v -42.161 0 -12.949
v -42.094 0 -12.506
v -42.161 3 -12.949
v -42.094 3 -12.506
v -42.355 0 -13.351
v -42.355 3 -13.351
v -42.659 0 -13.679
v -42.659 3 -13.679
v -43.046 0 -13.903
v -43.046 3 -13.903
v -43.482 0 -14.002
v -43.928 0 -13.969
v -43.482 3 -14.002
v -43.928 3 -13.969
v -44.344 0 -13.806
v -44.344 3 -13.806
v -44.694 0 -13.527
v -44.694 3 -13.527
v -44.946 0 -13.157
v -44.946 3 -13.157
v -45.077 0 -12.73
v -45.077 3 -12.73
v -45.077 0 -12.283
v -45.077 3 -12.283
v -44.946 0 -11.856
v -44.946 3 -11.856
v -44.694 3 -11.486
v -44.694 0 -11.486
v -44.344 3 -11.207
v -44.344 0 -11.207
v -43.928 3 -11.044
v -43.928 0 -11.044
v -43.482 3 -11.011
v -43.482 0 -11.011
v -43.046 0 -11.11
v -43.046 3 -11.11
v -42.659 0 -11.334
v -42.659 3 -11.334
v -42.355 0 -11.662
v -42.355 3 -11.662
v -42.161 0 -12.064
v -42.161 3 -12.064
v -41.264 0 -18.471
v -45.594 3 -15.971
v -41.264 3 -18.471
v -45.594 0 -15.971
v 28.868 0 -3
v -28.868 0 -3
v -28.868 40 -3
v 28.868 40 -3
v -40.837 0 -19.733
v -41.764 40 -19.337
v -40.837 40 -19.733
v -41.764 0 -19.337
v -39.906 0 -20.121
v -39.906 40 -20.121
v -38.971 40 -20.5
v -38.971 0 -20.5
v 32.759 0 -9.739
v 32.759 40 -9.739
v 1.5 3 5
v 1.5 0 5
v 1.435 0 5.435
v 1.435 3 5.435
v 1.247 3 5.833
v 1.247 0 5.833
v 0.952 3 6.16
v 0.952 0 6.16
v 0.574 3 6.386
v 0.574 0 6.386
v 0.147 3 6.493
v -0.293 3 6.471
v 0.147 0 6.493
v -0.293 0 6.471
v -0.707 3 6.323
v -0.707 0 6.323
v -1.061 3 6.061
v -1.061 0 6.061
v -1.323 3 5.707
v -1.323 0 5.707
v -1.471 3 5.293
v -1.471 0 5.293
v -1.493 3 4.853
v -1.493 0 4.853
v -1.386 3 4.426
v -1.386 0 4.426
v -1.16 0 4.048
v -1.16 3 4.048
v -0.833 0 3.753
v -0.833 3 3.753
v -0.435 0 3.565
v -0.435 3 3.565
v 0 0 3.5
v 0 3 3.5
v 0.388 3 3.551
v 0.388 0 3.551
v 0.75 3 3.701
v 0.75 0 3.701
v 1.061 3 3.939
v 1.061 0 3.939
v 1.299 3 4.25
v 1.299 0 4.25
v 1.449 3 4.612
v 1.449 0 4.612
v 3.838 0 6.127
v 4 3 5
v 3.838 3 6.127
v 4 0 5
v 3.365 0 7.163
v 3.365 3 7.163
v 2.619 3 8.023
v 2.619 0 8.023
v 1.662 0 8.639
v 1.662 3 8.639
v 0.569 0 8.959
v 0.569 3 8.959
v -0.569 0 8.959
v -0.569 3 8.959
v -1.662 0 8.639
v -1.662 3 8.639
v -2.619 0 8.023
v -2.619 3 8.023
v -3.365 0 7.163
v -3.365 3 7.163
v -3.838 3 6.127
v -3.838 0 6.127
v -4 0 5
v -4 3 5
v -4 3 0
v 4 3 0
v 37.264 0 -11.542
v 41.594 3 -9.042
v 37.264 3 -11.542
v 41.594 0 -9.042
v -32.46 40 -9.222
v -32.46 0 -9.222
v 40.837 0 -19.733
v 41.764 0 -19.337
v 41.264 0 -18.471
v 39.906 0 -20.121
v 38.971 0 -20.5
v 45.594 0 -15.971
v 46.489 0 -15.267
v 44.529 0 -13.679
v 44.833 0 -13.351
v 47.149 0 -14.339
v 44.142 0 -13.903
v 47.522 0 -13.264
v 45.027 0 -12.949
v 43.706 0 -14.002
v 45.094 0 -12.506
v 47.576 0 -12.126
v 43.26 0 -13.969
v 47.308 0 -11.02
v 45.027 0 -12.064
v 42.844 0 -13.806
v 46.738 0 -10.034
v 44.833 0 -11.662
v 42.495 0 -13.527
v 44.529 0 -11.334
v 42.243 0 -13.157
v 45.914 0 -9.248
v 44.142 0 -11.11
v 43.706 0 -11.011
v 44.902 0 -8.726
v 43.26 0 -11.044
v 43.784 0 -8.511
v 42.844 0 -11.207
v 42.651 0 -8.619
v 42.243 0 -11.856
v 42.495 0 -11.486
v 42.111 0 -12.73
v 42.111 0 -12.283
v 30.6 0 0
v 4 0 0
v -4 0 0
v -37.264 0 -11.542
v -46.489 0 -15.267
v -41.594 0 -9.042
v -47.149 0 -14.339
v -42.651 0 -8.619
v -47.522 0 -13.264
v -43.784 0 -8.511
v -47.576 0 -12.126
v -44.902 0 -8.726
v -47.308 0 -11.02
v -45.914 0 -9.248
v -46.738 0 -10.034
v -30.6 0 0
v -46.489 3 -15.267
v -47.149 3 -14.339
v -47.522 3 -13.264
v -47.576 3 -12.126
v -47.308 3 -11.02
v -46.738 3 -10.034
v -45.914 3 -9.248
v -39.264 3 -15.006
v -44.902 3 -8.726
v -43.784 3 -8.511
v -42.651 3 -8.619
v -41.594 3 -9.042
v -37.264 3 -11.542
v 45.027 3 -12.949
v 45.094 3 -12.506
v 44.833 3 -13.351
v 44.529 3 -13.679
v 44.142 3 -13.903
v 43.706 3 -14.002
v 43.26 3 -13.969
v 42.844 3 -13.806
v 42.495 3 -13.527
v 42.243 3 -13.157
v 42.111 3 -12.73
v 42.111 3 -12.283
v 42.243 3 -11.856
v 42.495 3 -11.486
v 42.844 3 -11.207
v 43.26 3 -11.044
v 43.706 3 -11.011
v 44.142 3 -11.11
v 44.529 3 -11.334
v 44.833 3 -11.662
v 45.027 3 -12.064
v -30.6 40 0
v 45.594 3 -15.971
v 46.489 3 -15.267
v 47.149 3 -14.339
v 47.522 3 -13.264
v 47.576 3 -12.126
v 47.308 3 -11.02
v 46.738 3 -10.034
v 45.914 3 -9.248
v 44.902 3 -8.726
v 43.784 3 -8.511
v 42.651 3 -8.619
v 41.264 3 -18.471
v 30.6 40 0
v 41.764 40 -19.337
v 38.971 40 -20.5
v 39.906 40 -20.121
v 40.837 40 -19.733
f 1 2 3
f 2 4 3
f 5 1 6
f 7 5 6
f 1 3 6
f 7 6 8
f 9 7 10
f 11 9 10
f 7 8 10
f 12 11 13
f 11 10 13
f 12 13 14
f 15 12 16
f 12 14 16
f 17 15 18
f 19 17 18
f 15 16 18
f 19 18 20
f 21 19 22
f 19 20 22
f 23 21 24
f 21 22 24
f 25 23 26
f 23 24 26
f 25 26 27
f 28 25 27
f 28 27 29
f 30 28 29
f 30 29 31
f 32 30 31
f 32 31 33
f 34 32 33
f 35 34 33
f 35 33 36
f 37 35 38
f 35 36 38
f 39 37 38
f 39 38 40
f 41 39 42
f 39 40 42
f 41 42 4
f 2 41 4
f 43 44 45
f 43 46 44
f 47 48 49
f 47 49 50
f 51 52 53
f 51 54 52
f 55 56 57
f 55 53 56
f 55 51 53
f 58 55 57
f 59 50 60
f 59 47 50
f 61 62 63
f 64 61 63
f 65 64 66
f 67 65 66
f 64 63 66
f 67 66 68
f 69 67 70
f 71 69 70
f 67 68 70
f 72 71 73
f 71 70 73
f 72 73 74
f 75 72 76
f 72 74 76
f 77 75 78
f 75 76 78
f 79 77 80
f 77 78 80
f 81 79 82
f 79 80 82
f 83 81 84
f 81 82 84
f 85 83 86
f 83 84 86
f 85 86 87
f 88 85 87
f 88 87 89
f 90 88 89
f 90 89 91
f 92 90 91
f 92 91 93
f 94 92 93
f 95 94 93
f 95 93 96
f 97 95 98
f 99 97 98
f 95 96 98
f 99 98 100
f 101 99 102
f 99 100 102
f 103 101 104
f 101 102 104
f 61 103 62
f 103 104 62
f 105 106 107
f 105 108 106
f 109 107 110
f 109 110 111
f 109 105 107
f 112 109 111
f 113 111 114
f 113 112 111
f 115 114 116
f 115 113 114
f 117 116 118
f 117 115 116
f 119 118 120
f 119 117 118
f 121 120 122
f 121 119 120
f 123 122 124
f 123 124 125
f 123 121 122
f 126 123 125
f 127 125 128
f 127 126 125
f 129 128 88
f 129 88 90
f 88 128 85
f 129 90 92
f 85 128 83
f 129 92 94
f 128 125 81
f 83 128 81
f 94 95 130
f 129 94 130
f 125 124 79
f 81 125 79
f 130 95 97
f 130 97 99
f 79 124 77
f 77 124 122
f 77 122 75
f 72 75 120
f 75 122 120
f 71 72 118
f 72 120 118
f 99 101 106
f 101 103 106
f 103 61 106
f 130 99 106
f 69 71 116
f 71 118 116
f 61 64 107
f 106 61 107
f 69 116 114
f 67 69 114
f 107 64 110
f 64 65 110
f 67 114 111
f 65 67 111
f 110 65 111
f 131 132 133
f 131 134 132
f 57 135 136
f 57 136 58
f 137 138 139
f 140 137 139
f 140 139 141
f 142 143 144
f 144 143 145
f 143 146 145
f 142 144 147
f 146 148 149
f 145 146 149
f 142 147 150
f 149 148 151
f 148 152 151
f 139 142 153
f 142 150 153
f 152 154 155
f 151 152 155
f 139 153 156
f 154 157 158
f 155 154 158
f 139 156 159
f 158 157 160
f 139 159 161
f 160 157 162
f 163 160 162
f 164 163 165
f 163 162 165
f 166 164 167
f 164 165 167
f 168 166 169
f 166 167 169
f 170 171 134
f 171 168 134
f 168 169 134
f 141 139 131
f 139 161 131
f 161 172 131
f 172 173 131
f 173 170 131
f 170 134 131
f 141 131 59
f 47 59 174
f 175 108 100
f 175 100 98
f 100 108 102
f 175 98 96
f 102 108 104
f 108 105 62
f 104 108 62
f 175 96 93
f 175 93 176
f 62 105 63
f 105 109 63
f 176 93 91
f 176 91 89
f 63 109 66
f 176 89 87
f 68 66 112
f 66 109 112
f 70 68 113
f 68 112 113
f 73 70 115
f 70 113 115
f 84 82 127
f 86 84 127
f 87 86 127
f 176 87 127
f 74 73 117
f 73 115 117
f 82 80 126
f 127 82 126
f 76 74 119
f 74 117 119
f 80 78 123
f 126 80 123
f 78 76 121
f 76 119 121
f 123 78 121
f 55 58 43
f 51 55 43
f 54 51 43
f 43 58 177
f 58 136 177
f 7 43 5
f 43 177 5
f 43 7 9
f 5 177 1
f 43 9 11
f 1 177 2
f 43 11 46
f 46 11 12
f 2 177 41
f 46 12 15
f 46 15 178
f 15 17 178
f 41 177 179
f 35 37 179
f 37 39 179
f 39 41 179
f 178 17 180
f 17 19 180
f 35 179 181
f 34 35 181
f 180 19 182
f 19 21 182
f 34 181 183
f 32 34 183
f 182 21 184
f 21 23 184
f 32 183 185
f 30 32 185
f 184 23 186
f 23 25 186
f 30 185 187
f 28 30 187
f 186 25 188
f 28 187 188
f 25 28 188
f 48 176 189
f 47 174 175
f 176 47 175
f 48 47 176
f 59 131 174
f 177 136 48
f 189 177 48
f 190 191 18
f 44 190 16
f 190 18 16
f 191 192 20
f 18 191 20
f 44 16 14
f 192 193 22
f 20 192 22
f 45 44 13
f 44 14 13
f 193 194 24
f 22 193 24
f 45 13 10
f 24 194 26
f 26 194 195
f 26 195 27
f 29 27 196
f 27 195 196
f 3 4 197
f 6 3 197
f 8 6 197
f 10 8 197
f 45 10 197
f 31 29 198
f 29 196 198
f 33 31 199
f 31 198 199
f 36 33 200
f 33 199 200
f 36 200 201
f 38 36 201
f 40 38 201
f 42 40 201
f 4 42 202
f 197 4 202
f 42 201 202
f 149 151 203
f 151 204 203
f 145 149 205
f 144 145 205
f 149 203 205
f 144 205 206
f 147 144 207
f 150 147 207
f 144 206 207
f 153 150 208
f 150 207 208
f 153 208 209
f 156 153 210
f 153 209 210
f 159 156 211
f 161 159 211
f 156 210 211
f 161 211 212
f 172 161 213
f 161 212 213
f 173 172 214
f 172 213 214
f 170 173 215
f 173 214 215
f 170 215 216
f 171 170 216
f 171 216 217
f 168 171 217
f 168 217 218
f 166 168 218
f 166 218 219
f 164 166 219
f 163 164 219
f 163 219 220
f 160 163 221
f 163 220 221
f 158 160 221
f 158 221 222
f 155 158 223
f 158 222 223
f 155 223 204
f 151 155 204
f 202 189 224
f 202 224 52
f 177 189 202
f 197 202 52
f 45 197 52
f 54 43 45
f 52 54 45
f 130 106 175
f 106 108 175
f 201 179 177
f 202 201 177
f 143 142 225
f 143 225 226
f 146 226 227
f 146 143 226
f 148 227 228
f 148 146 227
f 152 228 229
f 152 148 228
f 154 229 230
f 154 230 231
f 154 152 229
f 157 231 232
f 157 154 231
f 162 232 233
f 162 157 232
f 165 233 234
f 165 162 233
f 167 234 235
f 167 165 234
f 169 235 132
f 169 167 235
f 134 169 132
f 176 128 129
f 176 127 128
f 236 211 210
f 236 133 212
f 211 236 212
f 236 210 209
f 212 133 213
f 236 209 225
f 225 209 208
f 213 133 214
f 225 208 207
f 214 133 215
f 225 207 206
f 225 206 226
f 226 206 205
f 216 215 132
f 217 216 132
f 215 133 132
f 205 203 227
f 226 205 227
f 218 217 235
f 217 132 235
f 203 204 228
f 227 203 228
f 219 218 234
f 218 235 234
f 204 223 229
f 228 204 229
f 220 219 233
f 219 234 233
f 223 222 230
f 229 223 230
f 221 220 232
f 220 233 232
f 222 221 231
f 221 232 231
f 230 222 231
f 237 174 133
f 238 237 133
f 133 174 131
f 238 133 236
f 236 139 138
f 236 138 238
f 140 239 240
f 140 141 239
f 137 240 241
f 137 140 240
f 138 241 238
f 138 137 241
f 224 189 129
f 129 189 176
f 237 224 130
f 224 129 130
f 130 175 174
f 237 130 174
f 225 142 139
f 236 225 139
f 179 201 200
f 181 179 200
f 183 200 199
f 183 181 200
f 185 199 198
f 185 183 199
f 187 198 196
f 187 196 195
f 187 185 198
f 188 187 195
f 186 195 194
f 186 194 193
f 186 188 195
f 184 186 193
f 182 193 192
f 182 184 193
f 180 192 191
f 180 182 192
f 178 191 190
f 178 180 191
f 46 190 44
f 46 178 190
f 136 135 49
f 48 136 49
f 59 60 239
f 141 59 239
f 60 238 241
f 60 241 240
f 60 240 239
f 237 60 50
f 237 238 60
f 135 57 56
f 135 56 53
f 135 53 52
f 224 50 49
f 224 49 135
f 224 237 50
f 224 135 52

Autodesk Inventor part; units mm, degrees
ref_plane "YZ Plane" through (0, 0, 0) normal (1, 0, 0) x (0, 1, 0)
ref_plane "XZ Plane" through (0, 0, 0) normal (0, 1, 0) x (-1, 0, 0)
ref_plane "XY Plane" through (0, 0, 0) normal (0, 0, 1) x (1, 0, 0)
sketch "Sketch1" plane through (0, 0, 0) normal (0, 1, 0) x (-1, 0, 0)
  line L0 (0, 0) -> (-30.6, 0)
  line L1 (0, 0) -> (30.6, 0)
  line L2 (30.6, 0) -> (41.764, -19.3366)
  line L3 (30.6, 0) -> (52.928, 0) construction
  line L4 (-30.6, 0) -> (-41.764, -19.3366)
  line L5 (-30.6, 0) -> (-8.272, 0) construction
  line L6 (0, 0) -> (0, 77)
  line L7 (0, 0) -> (0, -3)
  line L8 (-35.3569, -8.2392) -> (-32.7588, -9.7392)
  line L9 (35.0582, -7.7219) -> (32.4602, -9.2219)
  line L10 (32.4602, -9.2219) -> (28.8679, -3)
  line L11 (28.8679, -3) -> (0, -3)
  line L12 (0, -3) -> (-28.8679, -3)
  line L13 (-28.8679, -3) -> (-32.7588, -9.7392)
  line L14 (-32.7588, -9.7392) -> (-38.9714, -20.4998)
  line L15 (32.4602, -9.2219) -> (38.9714, -20.4998)
  arc A0 (38.9714, -20.4998) -> (41.764, -19.3366) centre (0, 77) ccw
  arc A1 (-41.764, -19.3366) -> (-38.9714, -20.4998) centre (0, 77) ccw
  dimension "d0" = 30.6
  dimension "d1" = 30.6
  dimension "d2" = 22.328
  dimension "d3" = 60
  dimension "d4" = 22.328
  dimension "d5" = 120
  dimension "d6" = 77
  dimension "d7" = 3
  dimension "d8" = 3
  dimension "d9" = 3
extrude "Extrusion1" add sketch "Sketch1" along normal blind 40
sketch "Sketch2" plane through (0, 0, 0) normal (0, -1, 0) x (1, 0, 0)
  line L0 (0, 0) -> (0, 5)
  circle A0 centre (0, 5) radius 1.5
  line L1 (-41.764, -19.3366) -> (-39.264, -15.0065)
  line L2 (-41.764, -19.3366) -> (-30.6, 0) projected
  line L3 (-39.264, -15.0065) -> (-43.5941, -12.5065)
  arc A1 (38.9714, -20.4998) -> (41.764, -19.3366) centre (0, 77) ccw projected
  line L4 (38.9714, -20.4998) -> (39.264, -15.0065)
  line L5 (30.6, 0) -> (41.764, -19.3366) projected
  line L6 (41.764, -19.3366) -> (39.264, -15.0065)
  line L7 (39.264, -15.0065) -> (43.5941, -12.5065)
  circle A2 centre (43.5941, -12.5065) radius 1.5
  circle A3 centre (-43.5941, -12.5065) radius 1.5
  circle A4 centre (-43.5941, -12.5065) radius 4
  circle A5 centre (0, 5) radius 4
  circle A6 centre (43.5941, -12.5065) radius 4
  line L8 (43.5941, -12.5065) -> (45.5941, -15.9706)
  line L9 (45.5941, -15.9706) -> (41.264, -18.4706)
  line L10 (43.5941, -12.5065) -> (41.5941, -9.0424)
  line L11 (41.5941, -9.0424) -> (37.264, -11.5424)
  line L12 (4, 5) -> (4, 0)
  line L13 (-30.6, 0) -> (30.6, 0) projected
  line L14 (-4, 5) -> (-4, 0)
  line L15 (-43.5941, -12.5065) -> (-45.5941, -15.9706)
  line L16 (-45.5941, -15.9706) -> (-41.264, -18.4706)
  line L17 (-41.764, -19.3366) -> (-30.6, 0) projected
  line L18 (-43.5941, -12.5065) -> (-41.5941, -9.0424)
  line L19 (-41.5941, -9.0424) -> (-37.264, -11.5424)
  dimension "d12" = 5
  dimension "d13" = 3
  dimension "d14" = 5
  dimension "d15" = 5
  dimension "d16" = 5.5011
  dimension "d17" = 5
  dimension "d18" = 3
  dimension "d19" = 8
  dimension "d20" = 8
  dimension "d21" = 8
extrude "Extrusion2" add sketch "Sketch2" against normal blind 3 contours L13 L14 A5 L0 | L2 L3 A4 L19 | L11 A6 L7 L5 | L0 A5 L12 L13 | A5 | L1 L16 A4 L3 | L18 A3 L15 A4 | A4 L3 A3 L18 | L7 A6 L9 L5 | L10 A2 L7 A6 | A6 L8 A2 L10 | A4 L15 A3 L3 | L18 L15 A3 | A3 L3 L18 | L7 A2 L8 A6 | L10 L7 A2 | A2 L8 L10 | A3 L15 L3 | L7 L8 A2
sketch "Sketch3" plane through (0, 3, 0) normal (0, 1, 0) x (1, 0, 0)
  arc A0 (41.5941, 9.0424) -> (45.5941, 15.9706) centre (43.5941, 12.5065) ccw projected
  circle A1 centre (43.5941, 12.5065) radius 1.5
  arc A2 (-45.5941, 15.9706) -> (-41.5941, 9.0424) centre (-43.5941, 12.5065) ccw projected
  circle A3 centre (-43.5941, 12.5065) radius 1.5
  point P0 (0, 0)
  dimension "d24" = 3
extrude "Extrusion3" cut sketch "Sketch3" against normal blind 3
properties part number "Capcture Zone"
